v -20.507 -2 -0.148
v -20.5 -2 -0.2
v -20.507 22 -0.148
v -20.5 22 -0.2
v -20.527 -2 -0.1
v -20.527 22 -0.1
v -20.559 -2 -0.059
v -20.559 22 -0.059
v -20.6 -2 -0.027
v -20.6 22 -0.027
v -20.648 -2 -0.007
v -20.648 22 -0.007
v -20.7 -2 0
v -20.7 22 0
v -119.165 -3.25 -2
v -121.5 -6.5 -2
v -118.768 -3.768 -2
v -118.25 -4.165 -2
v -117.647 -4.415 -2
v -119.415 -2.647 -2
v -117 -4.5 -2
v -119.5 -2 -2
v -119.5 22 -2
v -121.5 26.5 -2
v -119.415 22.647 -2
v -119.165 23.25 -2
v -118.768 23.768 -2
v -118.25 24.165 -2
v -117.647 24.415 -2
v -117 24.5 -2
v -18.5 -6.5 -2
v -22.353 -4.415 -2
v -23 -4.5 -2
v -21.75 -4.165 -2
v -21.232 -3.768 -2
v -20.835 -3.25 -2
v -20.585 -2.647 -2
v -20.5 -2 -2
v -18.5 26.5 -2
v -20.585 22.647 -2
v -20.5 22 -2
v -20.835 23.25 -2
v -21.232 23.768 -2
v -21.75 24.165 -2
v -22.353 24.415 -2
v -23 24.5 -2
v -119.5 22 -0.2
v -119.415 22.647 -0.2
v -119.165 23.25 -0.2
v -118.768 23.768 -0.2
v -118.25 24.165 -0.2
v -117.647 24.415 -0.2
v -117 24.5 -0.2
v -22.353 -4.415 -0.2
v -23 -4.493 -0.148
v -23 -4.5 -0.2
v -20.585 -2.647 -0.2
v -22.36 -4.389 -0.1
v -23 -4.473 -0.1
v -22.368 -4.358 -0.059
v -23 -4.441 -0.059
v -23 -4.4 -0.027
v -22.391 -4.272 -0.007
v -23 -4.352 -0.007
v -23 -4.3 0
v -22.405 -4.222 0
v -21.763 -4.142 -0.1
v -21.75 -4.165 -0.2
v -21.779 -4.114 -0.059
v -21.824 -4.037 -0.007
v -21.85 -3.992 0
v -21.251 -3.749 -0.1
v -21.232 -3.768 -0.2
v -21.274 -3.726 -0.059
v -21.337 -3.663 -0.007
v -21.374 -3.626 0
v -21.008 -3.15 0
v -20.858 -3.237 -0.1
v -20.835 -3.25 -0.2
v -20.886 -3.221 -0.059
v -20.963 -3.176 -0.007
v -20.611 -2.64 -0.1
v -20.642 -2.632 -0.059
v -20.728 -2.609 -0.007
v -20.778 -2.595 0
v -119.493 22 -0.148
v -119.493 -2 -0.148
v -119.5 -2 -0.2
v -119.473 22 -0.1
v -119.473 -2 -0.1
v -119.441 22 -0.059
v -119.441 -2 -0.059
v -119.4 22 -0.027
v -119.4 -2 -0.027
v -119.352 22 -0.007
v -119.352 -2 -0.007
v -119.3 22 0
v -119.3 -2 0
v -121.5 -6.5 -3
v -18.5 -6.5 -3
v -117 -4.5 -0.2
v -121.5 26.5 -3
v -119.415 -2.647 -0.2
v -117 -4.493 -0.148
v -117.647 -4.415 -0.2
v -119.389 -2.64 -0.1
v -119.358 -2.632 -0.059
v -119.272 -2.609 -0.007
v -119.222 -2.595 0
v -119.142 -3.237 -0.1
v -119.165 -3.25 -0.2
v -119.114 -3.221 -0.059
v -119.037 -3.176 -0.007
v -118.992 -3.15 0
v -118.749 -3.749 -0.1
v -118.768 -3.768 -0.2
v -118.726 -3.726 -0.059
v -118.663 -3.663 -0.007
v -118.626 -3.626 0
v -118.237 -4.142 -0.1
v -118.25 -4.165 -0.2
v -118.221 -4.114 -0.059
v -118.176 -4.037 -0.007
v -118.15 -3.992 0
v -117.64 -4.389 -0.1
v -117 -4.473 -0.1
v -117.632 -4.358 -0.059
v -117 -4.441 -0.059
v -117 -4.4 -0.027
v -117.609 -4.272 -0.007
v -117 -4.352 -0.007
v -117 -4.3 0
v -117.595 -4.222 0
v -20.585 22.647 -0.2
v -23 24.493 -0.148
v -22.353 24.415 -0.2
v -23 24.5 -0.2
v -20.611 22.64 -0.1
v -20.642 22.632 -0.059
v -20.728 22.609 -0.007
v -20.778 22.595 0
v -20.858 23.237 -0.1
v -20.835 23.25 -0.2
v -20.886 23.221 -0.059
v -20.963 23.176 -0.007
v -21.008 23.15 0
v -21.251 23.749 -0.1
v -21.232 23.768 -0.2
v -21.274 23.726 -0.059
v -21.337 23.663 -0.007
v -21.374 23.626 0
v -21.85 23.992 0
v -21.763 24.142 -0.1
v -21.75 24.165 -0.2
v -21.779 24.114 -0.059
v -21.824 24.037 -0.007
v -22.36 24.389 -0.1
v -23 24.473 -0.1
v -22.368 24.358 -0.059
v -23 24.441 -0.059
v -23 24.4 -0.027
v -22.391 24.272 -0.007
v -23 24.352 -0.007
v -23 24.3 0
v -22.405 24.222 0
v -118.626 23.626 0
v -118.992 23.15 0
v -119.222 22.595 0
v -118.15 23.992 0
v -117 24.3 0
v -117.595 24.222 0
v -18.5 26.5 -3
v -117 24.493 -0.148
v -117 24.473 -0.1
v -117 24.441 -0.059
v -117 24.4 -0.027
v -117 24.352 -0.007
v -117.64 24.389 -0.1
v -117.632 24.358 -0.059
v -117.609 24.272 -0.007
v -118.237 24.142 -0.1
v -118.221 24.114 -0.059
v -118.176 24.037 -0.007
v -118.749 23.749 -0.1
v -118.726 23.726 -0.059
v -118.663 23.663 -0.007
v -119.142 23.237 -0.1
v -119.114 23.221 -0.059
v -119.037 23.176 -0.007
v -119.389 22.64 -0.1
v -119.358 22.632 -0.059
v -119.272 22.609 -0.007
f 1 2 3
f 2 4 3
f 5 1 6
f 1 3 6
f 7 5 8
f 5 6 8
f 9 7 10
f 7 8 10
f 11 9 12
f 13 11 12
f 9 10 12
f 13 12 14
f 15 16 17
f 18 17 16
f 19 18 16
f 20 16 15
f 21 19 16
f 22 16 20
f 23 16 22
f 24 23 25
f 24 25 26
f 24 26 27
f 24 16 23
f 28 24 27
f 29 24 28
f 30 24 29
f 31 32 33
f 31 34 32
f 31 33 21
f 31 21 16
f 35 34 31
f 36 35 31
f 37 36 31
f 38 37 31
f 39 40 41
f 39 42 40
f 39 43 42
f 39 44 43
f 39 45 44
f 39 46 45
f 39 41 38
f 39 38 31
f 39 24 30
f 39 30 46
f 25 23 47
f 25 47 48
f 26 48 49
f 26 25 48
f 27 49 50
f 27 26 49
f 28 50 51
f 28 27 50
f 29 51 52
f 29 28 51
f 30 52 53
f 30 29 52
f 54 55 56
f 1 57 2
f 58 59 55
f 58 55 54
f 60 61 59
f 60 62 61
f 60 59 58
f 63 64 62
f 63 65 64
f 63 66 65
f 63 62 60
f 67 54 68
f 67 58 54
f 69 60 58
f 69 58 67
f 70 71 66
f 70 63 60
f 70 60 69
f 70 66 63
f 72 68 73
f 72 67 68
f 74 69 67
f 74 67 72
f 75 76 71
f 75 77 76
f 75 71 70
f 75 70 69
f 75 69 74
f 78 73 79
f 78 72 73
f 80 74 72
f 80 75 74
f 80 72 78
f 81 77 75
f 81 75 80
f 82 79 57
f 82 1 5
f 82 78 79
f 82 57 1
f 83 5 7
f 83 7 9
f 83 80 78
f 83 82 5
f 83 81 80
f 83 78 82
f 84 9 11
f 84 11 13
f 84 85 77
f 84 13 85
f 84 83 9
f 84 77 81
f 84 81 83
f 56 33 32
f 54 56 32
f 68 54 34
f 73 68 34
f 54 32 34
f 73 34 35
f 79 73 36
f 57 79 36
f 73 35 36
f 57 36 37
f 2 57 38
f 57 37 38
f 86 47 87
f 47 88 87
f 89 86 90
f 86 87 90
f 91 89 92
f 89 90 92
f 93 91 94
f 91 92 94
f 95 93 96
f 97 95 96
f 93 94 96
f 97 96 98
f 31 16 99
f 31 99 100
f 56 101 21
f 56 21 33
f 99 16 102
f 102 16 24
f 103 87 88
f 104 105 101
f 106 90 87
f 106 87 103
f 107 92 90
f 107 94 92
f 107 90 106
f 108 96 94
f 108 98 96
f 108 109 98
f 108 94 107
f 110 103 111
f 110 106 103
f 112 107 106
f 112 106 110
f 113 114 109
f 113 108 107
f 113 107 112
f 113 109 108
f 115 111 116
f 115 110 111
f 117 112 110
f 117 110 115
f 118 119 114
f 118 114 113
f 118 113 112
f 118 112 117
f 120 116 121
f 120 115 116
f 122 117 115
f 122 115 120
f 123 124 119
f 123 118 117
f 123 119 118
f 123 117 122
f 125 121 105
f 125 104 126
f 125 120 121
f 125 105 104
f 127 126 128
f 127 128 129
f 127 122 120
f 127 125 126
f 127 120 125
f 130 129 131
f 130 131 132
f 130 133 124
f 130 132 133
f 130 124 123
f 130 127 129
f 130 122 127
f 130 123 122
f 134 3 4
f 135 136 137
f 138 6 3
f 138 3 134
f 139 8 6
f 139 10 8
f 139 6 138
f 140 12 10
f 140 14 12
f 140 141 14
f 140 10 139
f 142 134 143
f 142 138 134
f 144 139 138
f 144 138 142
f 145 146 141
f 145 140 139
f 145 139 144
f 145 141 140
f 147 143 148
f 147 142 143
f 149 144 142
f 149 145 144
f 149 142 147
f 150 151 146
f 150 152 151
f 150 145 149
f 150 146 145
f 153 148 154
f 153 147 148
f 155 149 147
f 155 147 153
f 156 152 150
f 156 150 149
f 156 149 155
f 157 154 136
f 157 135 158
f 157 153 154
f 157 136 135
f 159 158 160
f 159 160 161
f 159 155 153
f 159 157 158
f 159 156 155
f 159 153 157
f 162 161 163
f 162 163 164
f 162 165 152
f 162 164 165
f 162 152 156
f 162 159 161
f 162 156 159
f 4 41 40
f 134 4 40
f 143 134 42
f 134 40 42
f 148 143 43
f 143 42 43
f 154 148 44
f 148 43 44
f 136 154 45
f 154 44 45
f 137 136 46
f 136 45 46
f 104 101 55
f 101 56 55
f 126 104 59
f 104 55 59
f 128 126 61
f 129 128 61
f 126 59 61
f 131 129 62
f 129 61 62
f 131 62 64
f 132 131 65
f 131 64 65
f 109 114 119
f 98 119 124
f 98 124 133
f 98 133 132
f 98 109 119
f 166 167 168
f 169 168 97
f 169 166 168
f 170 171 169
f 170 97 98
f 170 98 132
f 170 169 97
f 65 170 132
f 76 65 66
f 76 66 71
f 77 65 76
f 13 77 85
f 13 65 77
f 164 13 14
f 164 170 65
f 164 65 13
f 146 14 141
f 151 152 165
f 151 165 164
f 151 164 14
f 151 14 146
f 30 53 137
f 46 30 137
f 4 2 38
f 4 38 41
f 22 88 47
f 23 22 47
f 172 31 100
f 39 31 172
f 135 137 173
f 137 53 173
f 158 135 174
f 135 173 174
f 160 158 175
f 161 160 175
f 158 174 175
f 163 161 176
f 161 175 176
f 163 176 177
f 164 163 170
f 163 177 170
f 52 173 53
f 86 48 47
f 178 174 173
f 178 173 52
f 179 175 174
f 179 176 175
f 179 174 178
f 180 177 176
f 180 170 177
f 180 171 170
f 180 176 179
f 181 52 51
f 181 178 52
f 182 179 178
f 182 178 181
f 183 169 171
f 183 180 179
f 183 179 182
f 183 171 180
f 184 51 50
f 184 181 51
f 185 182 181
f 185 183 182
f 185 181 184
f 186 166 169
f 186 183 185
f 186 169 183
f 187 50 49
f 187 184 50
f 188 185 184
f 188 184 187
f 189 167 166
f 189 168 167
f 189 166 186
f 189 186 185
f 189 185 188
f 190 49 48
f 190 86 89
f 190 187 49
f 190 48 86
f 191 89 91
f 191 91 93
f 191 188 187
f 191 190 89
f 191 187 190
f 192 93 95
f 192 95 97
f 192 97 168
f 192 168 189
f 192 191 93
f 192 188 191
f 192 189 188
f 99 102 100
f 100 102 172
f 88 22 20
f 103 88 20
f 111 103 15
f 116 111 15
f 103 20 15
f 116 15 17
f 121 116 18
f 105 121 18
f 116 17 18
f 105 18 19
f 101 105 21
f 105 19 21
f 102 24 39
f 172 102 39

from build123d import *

# Parameters (mm, degrees)
SKETCH_1_W      = 99
SKETCH_1_H      = 29
EXTRUDE_2_DEPTH = 2
FILLET_1_R      = 2.5
SKETCH_3_W      = 103
SKETCH_3_H      = 33
EXTRUDE_3_DEPTH = 1
FILLET_2_R      = 0.2


with BuildPart() as part:
    # Эскиз1 → Бобышка-Вытянуть2 (new body)
    with BuildSketch(Plane.XY):
        with Locations((-70, 10)):
            Rectangle(SKETCH_1_W, SKETCH_1_H)
    extrude(amount=-EXTRUDE_2_DEPTH)

    # Скругление1
    fillet_1_edges = [part.edges().sort_by_distance(p)[0] for p in [
        (-119.5, 24.5, -1),
        (-20.5, 24.5, -1),
        (-20.5, -4.5, -1),
        (-119.5, -4.5, -1),
    ]]
    fillet(fillet_1_edges, radius=FILLET_1_R)

    # Эскиз3 → Бобышка-Вытянуть3 (add)
    with BuildSketch(Plane.XY.offset(-2)):
        with Locations((-70, 10)):
            Rectangle(SKETCH_3_W, SKETCH_3_H)
    extrude(amount=-EXTRUDE_3_DEPTH)

    # Скругление2
    fillet_2_edges = [part.edges().sort_by_distance(p)[0] for p in [
        (-70, -4.5, 0),
        (-119.5, 10, 0),
        (-20.5, 10, 0),
        (-70, 24.5, 0),
        (-21.232233047, 23.767766953, 0),
        (-118.767766953, 23.767766953, 0),
        (-118.767766953, -3.767766953, 0),
        (-21.232233047, -3.767766953, 0),
    ]]
    fillet(fillet_2_edges, radius=FILLET_2_R)


solid = part.part
